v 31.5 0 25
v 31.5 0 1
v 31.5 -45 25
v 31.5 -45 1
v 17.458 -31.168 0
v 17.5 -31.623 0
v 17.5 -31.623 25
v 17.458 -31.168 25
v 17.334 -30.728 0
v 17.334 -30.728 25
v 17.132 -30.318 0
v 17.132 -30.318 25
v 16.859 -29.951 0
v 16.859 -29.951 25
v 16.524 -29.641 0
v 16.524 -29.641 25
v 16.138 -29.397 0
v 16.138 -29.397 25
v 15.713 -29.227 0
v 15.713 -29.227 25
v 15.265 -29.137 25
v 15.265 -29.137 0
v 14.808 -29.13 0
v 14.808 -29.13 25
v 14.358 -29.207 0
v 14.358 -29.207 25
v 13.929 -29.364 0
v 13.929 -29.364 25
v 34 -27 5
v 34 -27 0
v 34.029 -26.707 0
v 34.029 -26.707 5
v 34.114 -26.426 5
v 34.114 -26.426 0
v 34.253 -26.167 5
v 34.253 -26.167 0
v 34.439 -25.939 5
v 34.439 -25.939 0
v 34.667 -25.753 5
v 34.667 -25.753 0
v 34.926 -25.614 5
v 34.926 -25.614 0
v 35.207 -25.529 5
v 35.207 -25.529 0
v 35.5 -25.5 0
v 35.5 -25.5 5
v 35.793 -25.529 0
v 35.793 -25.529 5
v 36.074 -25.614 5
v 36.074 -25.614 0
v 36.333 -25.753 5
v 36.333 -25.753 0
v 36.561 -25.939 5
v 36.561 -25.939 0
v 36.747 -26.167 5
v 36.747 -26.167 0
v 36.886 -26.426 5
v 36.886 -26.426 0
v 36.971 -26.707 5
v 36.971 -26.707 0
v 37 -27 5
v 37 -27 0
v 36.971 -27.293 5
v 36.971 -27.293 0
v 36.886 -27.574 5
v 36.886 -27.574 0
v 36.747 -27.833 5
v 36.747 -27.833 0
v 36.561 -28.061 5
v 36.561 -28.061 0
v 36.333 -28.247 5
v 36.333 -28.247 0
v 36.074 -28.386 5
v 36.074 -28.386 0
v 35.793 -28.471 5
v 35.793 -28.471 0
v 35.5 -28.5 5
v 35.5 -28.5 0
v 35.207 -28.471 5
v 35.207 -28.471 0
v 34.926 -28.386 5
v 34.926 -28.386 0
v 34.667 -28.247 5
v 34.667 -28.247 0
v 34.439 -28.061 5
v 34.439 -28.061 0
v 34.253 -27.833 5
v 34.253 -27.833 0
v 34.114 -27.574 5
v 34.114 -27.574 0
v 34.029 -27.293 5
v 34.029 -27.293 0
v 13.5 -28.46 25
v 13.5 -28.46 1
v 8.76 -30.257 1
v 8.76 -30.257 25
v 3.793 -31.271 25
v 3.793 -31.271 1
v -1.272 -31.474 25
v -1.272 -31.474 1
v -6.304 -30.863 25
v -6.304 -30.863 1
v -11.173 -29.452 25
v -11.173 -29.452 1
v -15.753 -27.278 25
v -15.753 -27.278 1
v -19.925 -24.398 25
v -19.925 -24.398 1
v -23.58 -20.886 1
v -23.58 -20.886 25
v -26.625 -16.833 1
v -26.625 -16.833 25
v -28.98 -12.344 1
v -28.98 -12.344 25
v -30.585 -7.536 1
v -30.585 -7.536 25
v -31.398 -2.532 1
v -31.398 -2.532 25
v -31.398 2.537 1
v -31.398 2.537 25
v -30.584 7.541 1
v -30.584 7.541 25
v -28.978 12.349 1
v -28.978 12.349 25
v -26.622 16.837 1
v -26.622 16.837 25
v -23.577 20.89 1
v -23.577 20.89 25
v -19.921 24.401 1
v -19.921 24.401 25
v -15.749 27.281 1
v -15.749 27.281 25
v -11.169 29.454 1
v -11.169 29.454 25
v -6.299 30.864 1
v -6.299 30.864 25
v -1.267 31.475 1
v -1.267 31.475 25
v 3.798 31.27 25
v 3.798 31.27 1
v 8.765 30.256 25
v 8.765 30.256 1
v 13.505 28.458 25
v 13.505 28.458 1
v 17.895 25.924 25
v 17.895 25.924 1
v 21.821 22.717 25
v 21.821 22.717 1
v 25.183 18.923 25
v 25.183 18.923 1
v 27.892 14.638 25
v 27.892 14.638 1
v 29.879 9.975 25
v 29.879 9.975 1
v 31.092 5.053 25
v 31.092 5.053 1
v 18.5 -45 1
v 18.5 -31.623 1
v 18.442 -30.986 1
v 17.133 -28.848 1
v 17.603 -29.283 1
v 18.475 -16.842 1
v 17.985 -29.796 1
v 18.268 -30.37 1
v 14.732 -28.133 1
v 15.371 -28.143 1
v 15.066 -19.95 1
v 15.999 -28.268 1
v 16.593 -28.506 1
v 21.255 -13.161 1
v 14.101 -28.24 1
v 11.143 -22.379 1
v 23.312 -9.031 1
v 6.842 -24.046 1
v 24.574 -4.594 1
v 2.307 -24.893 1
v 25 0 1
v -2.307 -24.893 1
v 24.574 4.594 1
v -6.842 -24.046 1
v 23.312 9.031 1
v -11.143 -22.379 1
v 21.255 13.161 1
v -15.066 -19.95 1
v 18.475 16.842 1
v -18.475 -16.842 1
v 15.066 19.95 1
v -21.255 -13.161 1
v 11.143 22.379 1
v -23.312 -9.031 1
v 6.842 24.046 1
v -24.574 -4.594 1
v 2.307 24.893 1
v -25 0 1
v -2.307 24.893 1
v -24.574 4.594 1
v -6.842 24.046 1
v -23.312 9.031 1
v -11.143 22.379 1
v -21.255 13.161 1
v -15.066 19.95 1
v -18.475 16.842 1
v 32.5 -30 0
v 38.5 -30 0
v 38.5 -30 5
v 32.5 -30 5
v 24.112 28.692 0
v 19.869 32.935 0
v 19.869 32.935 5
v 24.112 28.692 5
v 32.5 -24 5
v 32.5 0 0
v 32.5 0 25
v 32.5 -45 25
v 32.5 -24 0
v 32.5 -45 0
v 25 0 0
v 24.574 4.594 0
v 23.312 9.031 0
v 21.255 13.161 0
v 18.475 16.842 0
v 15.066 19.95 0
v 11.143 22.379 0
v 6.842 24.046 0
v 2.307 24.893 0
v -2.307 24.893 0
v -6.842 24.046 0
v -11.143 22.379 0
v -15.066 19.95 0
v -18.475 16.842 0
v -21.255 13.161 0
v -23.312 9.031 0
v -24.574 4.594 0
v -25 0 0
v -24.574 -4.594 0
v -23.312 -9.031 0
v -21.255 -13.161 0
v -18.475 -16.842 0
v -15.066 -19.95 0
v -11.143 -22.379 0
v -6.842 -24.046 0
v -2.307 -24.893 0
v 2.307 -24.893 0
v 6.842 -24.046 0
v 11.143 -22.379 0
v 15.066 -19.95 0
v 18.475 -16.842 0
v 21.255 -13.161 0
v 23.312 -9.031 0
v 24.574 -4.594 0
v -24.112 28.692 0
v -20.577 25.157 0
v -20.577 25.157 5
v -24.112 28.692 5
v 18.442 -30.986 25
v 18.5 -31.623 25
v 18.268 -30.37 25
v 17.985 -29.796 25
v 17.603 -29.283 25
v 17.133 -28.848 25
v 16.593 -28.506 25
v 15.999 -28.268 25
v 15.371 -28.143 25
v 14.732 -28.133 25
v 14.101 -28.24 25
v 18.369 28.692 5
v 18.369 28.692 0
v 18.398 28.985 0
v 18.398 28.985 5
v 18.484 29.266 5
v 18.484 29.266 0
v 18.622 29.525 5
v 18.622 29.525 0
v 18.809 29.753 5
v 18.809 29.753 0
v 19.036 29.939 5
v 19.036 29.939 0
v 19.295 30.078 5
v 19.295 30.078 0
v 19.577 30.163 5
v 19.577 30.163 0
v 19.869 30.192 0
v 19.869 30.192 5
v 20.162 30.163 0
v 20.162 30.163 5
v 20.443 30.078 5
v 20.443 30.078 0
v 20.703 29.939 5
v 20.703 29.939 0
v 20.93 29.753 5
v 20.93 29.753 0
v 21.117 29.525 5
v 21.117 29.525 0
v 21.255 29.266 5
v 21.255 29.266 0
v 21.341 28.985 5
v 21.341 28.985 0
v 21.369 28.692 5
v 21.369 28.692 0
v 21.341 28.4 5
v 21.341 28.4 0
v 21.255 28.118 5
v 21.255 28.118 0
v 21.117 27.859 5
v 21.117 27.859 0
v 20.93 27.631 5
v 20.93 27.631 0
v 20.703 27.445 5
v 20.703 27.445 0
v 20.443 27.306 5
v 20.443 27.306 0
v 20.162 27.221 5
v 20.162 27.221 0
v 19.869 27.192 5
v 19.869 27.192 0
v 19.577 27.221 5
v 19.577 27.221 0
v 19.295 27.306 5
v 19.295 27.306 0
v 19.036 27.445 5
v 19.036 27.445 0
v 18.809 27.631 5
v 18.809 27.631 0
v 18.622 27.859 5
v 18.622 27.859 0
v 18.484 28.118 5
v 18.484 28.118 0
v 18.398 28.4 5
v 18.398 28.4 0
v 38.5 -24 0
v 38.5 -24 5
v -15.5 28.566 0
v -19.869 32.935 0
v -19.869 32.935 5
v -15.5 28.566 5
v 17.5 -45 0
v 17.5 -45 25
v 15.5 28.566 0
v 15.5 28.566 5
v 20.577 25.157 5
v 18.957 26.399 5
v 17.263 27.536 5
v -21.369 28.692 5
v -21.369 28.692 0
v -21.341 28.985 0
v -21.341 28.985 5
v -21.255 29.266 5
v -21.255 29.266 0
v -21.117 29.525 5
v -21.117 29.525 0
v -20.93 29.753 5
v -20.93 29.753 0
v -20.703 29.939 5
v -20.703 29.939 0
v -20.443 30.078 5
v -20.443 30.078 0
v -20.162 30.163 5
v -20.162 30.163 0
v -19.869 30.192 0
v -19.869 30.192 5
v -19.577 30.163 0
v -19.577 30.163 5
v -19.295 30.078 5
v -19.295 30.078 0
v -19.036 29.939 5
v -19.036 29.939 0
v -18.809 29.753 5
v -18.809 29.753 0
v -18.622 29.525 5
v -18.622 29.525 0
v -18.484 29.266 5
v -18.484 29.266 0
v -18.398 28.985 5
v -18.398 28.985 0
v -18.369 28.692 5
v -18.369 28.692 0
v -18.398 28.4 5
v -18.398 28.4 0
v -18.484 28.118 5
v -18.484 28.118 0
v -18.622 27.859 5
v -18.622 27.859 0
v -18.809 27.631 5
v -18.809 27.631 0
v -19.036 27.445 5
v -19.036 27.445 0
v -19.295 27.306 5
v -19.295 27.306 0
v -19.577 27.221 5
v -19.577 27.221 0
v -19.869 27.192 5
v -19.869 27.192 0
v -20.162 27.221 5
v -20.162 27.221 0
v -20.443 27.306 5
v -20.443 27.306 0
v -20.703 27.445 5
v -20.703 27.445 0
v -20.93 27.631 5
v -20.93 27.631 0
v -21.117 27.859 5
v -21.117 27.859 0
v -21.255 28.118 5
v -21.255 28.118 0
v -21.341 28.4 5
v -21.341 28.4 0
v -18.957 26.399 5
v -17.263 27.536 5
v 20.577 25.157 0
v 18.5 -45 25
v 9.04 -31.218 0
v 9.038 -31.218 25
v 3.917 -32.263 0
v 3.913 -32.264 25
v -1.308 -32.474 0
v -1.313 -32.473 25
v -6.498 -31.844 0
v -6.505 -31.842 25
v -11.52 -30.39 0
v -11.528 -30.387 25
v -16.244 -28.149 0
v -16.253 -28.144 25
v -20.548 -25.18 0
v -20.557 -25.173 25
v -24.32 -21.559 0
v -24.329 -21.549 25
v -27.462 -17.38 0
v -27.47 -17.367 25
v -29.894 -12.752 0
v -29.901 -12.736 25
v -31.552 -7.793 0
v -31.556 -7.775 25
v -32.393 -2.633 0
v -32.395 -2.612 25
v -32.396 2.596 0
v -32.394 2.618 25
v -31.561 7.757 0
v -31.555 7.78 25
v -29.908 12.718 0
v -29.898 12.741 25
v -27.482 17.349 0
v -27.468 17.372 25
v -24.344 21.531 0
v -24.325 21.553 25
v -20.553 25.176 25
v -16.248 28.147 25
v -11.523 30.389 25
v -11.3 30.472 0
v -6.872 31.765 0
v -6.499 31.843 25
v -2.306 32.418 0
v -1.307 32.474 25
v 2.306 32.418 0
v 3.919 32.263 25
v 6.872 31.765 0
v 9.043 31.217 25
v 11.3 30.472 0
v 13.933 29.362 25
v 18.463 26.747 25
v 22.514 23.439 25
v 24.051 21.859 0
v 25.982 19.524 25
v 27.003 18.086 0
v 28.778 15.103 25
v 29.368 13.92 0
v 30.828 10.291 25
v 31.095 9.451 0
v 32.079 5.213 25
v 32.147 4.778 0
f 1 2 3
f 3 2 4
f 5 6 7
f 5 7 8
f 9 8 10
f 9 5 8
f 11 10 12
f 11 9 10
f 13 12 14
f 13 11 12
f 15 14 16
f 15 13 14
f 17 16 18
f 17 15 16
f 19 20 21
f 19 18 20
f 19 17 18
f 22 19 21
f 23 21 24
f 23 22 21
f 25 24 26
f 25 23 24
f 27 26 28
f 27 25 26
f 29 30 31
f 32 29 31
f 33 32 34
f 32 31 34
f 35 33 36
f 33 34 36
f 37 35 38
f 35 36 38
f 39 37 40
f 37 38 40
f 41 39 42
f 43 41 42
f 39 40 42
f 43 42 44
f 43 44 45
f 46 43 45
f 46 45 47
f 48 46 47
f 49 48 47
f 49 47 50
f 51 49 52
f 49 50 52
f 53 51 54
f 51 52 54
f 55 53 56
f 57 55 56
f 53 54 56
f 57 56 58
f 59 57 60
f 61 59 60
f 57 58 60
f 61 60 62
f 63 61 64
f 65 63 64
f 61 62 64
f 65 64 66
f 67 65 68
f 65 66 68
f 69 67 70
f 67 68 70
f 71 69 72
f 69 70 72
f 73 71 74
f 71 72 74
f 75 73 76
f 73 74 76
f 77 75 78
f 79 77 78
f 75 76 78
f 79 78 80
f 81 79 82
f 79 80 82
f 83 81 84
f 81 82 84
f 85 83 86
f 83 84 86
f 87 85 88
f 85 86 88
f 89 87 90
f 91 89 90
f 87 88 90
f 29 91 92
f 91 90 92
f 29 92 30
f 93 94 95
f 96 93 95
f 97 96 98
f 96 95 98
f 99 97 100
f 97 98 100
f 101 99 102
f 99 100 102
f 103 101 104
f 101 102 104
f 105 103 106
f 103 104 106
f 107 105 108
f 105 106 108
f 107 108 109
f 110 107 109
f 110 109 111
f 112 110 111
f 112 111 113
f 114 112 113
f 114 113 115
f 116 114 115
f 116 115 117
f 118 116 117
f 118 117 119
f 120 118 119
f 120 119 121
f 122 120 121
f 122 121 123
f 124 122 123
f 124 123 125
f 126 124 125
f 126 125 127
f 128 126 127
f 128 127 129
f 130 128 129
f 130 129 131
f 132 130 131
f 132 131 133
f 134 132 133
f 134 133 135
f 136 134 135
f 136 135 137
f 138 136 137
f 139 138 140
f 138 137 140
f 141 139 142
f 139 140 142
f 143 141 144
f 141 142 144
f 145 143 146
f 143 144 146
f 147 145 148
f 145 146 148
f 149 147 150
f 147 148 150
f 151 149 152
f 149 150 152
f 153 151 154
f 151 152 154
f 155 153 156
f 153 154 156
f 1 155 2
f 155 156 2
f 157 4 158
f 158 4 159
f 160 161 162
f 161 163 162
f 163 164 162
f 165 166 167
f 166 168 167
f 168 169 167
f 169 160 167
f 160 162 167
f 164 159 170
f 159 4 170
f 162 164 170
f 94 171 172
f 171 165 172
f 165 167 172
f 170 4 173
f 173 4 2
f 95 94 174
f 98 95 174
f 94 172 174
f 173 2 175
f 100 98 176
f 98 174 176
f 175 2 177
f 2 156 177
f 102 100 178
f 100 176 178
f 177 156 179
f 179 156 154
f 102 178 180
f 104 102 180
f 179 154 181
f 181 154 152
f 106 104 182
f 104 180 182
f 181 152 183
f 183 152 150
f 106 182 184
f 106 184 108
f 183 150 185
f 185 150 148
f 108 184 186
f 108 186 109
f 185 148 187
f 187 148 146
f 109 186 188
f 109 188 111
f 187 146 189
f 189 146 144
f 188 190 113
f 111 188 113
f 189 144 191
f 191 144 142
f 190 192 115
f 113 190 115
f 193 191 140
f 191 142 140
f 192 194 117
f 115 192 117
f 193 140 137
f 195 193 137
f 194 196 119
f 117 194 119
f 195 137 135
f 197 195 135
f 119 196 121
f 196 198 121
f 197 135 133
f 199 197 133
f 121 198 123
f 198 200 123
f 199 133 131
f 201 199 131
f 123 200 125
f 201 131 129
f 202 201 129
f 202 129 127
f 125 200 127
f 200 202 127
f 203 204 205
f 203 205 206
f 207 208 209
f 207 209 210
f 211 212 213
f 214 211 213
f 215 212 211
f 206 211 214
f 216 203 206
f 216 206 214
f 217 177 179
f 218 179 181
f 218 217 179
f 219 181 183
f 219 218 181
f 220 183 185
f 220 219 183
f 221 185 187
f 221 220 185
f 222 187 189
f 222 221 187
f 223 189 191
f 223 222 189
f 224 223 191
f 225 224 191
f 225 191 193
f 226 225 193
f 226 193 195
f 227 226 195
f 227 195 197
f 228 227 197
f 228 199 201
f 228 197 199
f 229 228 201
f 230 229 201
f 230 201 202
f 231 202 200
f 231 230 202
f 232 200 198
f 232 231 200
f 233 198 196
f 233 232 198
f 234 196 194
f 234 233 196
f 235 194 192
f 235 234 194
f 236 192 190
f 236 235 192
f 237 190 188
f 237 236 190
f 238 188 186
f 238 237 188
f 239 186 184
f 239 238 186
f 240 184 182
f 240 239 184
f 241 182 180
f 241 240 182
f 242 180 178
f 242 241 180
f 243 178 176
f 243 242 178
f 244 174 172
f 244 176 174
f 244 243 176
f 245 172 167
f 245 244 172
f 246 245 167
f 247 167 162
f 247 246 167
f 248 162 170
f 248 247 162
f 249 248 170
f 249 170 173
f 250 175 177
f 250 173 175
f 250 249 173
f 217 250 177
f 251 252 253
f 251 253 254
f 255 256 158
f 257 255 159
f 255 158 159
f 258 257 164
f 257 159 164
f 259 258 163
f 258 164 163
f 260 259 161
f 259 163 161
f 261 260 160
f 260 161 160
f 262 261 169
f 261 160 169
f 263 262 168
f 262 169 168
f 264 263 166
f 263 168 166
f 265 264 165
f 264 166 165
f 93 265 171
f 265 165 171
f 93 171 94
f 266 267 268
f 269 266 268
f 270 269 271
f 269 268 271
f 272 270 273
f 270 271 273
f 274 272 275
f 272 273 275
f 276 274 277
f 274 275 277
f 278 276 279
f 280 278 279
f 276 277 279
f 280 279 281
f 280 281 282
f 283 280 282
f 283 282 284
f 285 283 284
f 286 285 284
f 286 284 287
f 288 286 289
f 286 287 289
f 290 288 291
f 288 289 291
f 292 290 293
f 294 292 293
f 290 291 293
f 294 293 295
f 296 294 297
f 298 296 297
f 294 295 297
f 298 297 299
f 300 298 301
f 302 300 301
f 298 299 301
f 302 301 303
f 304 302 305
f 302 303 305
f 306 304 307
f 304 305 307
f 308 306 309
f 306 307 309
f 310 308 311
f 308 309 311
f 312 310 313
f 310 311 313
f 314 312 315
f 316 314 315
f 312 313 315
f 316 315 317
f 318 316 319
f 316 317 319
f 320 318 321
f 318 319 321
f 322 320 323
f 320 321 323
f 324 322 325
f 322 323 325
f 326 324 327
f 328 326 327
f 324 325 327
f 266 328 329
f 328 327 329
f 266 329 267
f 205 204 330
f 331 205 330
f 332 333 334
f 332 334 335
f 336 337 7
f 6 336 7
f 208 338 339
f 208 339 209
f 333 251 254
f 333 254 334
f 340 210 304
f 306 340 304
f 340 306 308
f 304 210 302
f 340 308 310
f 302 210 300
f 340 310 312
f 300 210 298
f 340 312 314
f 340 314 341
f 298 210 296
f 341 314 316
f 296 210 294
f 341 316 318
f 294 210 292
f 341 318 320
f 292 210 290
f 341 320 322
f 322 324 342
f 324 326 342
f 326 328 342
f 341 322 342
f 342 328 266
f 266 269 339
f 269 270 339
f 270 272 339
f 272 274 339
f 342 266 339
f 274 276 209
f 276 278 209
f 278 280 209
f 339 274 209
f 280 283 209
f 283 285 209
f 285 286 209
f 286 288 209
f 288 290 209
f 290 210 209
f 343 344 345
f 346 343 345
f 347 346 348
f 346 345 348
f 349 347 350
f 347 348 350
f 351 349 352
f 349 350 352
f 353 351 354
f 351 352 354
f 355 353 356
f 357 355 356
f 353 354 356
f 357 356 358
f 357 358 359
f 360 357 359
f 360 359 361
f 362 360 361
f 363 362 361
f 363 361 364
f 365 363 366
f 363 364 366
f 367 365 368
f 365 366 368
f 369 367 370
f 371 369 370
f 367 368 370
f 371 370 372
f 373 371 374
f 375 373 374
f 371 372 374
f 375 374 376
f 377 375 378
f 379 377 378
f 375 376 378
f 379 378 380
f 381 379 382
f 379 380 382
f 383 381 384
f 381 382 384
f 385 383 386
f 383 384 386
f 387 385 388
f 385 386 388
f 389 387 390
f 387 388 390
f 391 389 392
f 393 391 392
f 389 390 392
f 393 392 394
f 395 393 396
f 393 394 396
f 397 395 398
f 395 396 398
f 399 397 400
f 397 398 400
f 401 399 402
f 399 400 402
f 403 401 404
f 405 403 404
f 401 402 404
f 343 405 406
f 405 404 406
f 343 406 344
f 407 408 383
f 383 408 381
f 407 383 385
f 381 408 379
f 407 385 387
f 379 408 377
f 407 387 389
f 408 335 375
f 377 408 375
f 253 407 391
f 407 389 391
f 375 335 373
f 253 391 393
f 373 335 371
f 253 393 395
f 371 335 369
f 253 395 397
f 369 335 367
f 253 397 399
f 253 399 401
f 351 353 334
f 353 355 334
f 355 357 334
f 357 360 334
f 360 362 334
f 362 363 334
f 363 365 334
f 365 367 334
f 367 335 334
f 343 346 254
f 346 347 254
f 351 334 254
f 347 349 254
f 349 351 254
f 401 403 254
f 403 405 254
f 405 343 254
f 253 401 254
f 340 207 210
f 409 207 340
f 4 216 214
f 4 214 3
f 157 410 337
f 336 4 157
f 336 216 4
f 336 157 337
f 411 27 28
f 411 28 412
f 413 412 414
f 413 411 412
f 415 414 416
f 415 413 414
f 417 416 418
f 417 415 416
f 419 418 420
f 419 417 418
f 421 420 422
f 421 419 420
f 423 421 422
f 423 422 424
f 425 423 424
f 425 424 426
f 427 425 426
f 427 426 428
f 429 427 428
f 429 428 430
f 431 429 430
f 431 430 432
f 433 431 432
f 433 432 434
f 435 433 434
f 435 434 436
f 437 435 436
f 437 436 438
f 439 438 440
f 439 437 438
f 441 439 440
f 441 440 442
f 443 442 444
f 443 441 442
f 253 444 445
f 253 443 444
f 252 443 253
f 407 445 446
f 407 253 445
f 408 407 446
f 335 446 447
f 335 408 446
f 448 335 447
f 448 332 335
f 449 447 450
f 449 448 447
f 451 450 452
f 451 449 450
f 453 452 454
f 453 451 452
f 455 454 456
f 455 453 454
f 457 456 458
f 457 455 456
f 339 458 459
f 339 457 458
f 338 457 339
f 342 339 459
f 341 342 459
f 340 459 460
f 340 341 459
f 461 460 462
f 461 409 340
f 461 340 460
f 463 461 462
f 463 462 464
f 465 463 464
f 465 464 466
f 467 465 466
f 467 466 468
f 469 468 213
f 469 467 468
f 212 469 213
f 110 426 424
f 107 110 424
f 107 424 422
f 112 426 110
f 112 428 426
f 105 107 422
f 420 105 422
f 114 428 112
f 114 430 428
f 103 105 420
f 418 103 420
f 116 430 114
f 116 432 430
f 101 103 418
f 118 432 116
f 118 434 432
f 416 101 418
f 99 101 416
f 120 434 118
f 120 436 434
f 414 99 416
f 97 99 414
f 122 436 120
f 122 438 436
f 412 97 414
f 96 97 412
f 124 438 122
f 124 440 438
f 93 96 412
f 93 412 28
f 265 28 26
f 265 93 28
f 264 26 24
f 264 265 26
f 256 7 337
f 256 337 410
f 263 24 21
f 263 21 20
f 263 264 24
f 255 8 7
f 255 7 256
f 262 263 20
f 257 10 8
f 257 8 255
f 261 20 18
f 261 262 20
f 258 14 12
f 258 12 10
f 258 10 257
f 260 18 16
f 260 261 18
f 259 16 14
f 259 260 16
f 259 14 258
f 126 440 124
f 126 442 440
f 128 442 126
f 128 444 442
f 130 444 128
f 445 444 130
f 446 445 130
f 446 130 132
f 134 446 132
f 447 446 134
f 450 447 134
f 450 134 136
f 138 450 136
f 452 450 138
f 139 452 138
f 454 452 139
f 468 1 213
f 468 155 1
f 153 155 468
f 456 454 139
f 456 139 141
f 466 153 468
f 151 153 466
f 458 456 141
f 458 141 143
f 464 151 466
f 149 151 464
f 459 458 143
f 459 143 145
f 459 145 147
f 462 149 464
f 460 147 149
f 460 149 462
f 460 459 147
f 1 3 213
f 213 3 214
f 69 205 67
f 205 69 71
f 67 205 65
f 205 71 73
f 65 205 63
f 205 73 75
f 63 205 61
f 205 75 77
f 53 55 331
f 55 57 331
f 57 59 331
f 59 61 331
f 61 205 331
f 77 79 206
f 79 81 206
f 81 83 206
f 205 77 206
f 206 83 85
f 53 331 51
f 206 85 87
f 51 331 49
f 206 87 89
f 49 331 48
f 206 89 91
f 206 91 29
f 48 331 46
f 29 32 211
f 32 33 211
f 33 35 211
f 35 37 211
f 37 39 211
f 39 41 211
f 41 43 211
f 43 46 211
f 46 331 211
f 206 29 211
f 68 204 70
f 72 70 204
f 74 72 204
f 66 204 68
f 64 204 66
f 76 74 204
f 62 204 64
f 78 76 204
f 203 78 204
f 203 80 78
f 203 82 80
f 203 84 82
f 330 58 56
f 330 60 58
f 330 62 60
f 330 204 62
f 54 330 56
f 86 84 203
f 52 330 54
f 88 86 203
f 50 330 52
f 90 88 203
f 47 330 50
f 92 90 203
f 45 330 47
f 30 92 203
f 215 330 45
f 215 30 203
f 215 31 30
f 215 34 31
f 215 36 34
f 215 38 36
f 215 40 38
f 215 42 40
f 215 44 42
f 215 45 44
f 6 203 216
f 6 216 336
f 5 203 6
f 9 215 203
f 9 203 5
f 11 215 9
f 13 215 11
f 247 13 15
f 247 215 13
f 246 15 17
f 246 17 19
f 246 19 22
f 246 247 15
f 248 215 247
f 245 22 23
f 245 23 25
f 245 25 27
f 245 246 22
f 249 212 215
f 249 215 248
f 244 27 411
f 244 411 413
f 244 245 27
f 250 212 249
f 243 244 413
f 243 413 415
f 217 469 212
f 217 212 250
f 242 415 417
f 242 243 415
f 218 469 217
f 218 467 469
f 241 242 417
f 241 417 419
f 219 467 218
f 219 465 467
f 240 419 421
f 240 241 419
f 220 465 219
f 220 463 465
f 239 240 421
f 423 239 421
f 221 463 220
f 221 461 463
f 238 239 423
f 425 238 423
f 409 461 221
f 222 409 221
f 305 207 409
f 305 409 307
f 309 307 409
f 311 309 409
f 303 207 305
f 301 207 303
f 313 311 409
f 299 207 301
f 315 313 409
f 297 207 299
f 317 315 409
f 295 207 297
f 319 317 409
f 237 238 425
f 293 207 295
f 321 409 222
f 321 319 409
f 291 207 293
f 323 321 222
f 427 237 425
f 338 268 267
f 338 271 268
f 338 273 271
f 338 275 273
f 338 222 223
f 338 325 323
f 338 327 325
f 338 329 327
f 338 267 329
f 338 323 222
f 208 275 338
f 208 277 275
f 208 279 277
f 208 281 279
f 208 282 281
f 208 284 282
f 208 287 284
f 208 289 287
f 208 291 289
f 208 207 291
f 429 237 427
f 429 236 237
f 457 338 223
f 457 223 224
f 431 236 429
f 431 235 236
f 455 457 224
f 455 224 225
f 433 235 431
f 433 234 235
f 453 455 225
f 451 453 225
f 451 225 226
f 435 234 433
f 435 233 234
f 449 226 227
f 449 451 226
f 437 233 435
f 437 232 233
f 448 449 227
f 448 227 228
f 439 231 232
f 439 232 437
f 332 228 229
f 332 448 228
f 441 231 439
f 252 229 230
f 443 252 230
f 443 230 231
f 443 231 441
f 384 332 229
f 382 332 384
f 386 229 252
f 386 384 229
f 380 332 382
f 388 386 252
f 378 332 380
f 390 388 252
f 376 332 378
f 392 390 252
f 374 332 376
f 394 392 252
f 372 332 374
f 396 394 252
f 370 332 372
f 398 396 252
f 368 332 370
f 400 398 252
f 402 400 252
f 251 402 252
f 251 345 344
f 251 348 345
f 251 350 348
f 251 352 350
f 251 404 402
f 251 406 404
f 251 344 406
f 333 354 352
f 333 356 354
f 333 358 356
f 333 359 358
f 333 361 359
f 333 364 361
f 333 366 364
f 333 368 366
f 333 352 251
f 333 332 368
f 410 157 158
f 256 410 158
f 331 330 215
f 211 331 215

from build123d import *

# Parameters (mm, degrees)
ESQUISSE1_R             = 25
BOSS_EXTRU_1_DEPTH      = 30
COQUE1_T                = -1
ENL_V_START             = -5
ENL_V_MAT_EXTRU_1_DEPTH = 5
ESQUISSE4_W             = 6
ESQUISSE4_H             = 6
ESQUISSE4_R             = 1.5
BOSS_EXTRU_3_DEPTH      = 5


with BuildPart() as part:
    # Esquisse1 → Boss.-Extru.1 (new body)
    with BuildSketch(Plane.XY):
        with BuildLine():
            Line((32.5, 0), (32.5, -45))
            Line((32.5, -45), (17.5, -45))
            Line((17.5, -45), (17.5, -31.622776602))
            ThreePointArc((17.5, -31.622776602), (16.33630621, -29.509890965), (13.928571429, -29.364006844))
            ThreePointArc((13.928571429, -29.364006844), (-27.467513279, 17.371980724), (32.5, 0))
        make_face()
        Circle(ESQUISSE1_R, mode=Mode.SUBTRACT)
    extrude(amount=BOSS_EXTRU_1_DEPTH)

    # Coque1
    coque1_openings = [part.faces().sort_by_distance(p)[0] for p in [
        (25, -45, 15),
        (-25, 0, 15),
    ]]
    offset(amount=COQUE1_T, openings=coque1_openings, kind=Kind.INTERSECTION)

    # Esquisse2 → Enlèv. mat.-Extru.1 (cut)
    with BuildSketch(Plane.XY.offset(30).offset(ENL_V_START)):
        with BuildLine():
            Line((17.5, -31.622776602), (17.5, -45))
            Line((17.5, -45), (32.5, -45))
            Line((32.5, -45), (32.5, 0))
            ThreePointArc((32.5, 0), (-27.467513279, 17.371980724), (13.928571429, -29.364006844))
            ThreePointArc((13.928571429, -29.364006844), (16.33630621, -29.509890965), (17.5, -31.622776602))
        make_face()
    extrude(amount=ENL_V_MAT_EXTRU_1_DEPTH, mode=Mode.SUBTRACT)

    # Esquisse4 → Boss.-Extru.3 (add)
    # profile 1 of 3: a face of its own
    with BuildSketch(Plane(origin=(0, 0, 0), x_dir=(-1, 0, 0), z_dir=(0, 0, -1))):
        with Locations((-35.5, -27)):
            Rectangle(ESQUISSE4_W, ESQUISSE4_H)
        with Locations((-35.5, -27)):
            Circle(ESQUISSE4_R, mode=Mode.SUBTRACT)
    # profile 2 of 3: a face of its own
    with BuildSketch(Plane(origin=(0, 0, 0), x_dir=(-1, 0, 0), z_dir=(0, 0, -1))):
        with BuildLine():
            Line((-24.112106084, 28.692136963), (-20.576572178, 25.156603057))
            ThreePointArc((-20.576572178, 25.156603057), (-18.118767277, 26.980738914), (-15.500260247, 28.5655725))
            Line((-15.500260247, 28.5655725), (-19.869465397, 32.93477765))
            Line((-19.869465397, 32.93477765), (-24.112106084, 28.692136963))
        make_face()
        with Locations((-19.869465397, 28.692136963)):
            Circle(ESQUISSE4_R, mode=Mode.SUBTRACT)
    # profile 3 of 3: a face of its own
    with BuildSketch(Plane(origin=(0, 0, 0), x_dir=(-1, 0, 0), z_dir=(0, 0, -1))):
        with BuildLine():
            Line((19.869465397, 32.93477765), (15.500260247, 28.5655725))
            ThreePointArc((15.500260247, 28.5655725), (18.118767277, 26.980738914), (20.576572178, 25.156603057))
            Line((20.576572178, 25.156603057), (24.112106084, 28.692136963))
            Line((24.112106084, 28.692136963), (19.869465397, 32.93477765))
        make_face()
        with Locations((19.869465397, 28.692136963)):
            Circle(ESQUISSE4_R, mode=Mode.SUBTRACT)
    extrude(amount=-BOSS_EXTRU_3_DEPTH)


solid = part.part
